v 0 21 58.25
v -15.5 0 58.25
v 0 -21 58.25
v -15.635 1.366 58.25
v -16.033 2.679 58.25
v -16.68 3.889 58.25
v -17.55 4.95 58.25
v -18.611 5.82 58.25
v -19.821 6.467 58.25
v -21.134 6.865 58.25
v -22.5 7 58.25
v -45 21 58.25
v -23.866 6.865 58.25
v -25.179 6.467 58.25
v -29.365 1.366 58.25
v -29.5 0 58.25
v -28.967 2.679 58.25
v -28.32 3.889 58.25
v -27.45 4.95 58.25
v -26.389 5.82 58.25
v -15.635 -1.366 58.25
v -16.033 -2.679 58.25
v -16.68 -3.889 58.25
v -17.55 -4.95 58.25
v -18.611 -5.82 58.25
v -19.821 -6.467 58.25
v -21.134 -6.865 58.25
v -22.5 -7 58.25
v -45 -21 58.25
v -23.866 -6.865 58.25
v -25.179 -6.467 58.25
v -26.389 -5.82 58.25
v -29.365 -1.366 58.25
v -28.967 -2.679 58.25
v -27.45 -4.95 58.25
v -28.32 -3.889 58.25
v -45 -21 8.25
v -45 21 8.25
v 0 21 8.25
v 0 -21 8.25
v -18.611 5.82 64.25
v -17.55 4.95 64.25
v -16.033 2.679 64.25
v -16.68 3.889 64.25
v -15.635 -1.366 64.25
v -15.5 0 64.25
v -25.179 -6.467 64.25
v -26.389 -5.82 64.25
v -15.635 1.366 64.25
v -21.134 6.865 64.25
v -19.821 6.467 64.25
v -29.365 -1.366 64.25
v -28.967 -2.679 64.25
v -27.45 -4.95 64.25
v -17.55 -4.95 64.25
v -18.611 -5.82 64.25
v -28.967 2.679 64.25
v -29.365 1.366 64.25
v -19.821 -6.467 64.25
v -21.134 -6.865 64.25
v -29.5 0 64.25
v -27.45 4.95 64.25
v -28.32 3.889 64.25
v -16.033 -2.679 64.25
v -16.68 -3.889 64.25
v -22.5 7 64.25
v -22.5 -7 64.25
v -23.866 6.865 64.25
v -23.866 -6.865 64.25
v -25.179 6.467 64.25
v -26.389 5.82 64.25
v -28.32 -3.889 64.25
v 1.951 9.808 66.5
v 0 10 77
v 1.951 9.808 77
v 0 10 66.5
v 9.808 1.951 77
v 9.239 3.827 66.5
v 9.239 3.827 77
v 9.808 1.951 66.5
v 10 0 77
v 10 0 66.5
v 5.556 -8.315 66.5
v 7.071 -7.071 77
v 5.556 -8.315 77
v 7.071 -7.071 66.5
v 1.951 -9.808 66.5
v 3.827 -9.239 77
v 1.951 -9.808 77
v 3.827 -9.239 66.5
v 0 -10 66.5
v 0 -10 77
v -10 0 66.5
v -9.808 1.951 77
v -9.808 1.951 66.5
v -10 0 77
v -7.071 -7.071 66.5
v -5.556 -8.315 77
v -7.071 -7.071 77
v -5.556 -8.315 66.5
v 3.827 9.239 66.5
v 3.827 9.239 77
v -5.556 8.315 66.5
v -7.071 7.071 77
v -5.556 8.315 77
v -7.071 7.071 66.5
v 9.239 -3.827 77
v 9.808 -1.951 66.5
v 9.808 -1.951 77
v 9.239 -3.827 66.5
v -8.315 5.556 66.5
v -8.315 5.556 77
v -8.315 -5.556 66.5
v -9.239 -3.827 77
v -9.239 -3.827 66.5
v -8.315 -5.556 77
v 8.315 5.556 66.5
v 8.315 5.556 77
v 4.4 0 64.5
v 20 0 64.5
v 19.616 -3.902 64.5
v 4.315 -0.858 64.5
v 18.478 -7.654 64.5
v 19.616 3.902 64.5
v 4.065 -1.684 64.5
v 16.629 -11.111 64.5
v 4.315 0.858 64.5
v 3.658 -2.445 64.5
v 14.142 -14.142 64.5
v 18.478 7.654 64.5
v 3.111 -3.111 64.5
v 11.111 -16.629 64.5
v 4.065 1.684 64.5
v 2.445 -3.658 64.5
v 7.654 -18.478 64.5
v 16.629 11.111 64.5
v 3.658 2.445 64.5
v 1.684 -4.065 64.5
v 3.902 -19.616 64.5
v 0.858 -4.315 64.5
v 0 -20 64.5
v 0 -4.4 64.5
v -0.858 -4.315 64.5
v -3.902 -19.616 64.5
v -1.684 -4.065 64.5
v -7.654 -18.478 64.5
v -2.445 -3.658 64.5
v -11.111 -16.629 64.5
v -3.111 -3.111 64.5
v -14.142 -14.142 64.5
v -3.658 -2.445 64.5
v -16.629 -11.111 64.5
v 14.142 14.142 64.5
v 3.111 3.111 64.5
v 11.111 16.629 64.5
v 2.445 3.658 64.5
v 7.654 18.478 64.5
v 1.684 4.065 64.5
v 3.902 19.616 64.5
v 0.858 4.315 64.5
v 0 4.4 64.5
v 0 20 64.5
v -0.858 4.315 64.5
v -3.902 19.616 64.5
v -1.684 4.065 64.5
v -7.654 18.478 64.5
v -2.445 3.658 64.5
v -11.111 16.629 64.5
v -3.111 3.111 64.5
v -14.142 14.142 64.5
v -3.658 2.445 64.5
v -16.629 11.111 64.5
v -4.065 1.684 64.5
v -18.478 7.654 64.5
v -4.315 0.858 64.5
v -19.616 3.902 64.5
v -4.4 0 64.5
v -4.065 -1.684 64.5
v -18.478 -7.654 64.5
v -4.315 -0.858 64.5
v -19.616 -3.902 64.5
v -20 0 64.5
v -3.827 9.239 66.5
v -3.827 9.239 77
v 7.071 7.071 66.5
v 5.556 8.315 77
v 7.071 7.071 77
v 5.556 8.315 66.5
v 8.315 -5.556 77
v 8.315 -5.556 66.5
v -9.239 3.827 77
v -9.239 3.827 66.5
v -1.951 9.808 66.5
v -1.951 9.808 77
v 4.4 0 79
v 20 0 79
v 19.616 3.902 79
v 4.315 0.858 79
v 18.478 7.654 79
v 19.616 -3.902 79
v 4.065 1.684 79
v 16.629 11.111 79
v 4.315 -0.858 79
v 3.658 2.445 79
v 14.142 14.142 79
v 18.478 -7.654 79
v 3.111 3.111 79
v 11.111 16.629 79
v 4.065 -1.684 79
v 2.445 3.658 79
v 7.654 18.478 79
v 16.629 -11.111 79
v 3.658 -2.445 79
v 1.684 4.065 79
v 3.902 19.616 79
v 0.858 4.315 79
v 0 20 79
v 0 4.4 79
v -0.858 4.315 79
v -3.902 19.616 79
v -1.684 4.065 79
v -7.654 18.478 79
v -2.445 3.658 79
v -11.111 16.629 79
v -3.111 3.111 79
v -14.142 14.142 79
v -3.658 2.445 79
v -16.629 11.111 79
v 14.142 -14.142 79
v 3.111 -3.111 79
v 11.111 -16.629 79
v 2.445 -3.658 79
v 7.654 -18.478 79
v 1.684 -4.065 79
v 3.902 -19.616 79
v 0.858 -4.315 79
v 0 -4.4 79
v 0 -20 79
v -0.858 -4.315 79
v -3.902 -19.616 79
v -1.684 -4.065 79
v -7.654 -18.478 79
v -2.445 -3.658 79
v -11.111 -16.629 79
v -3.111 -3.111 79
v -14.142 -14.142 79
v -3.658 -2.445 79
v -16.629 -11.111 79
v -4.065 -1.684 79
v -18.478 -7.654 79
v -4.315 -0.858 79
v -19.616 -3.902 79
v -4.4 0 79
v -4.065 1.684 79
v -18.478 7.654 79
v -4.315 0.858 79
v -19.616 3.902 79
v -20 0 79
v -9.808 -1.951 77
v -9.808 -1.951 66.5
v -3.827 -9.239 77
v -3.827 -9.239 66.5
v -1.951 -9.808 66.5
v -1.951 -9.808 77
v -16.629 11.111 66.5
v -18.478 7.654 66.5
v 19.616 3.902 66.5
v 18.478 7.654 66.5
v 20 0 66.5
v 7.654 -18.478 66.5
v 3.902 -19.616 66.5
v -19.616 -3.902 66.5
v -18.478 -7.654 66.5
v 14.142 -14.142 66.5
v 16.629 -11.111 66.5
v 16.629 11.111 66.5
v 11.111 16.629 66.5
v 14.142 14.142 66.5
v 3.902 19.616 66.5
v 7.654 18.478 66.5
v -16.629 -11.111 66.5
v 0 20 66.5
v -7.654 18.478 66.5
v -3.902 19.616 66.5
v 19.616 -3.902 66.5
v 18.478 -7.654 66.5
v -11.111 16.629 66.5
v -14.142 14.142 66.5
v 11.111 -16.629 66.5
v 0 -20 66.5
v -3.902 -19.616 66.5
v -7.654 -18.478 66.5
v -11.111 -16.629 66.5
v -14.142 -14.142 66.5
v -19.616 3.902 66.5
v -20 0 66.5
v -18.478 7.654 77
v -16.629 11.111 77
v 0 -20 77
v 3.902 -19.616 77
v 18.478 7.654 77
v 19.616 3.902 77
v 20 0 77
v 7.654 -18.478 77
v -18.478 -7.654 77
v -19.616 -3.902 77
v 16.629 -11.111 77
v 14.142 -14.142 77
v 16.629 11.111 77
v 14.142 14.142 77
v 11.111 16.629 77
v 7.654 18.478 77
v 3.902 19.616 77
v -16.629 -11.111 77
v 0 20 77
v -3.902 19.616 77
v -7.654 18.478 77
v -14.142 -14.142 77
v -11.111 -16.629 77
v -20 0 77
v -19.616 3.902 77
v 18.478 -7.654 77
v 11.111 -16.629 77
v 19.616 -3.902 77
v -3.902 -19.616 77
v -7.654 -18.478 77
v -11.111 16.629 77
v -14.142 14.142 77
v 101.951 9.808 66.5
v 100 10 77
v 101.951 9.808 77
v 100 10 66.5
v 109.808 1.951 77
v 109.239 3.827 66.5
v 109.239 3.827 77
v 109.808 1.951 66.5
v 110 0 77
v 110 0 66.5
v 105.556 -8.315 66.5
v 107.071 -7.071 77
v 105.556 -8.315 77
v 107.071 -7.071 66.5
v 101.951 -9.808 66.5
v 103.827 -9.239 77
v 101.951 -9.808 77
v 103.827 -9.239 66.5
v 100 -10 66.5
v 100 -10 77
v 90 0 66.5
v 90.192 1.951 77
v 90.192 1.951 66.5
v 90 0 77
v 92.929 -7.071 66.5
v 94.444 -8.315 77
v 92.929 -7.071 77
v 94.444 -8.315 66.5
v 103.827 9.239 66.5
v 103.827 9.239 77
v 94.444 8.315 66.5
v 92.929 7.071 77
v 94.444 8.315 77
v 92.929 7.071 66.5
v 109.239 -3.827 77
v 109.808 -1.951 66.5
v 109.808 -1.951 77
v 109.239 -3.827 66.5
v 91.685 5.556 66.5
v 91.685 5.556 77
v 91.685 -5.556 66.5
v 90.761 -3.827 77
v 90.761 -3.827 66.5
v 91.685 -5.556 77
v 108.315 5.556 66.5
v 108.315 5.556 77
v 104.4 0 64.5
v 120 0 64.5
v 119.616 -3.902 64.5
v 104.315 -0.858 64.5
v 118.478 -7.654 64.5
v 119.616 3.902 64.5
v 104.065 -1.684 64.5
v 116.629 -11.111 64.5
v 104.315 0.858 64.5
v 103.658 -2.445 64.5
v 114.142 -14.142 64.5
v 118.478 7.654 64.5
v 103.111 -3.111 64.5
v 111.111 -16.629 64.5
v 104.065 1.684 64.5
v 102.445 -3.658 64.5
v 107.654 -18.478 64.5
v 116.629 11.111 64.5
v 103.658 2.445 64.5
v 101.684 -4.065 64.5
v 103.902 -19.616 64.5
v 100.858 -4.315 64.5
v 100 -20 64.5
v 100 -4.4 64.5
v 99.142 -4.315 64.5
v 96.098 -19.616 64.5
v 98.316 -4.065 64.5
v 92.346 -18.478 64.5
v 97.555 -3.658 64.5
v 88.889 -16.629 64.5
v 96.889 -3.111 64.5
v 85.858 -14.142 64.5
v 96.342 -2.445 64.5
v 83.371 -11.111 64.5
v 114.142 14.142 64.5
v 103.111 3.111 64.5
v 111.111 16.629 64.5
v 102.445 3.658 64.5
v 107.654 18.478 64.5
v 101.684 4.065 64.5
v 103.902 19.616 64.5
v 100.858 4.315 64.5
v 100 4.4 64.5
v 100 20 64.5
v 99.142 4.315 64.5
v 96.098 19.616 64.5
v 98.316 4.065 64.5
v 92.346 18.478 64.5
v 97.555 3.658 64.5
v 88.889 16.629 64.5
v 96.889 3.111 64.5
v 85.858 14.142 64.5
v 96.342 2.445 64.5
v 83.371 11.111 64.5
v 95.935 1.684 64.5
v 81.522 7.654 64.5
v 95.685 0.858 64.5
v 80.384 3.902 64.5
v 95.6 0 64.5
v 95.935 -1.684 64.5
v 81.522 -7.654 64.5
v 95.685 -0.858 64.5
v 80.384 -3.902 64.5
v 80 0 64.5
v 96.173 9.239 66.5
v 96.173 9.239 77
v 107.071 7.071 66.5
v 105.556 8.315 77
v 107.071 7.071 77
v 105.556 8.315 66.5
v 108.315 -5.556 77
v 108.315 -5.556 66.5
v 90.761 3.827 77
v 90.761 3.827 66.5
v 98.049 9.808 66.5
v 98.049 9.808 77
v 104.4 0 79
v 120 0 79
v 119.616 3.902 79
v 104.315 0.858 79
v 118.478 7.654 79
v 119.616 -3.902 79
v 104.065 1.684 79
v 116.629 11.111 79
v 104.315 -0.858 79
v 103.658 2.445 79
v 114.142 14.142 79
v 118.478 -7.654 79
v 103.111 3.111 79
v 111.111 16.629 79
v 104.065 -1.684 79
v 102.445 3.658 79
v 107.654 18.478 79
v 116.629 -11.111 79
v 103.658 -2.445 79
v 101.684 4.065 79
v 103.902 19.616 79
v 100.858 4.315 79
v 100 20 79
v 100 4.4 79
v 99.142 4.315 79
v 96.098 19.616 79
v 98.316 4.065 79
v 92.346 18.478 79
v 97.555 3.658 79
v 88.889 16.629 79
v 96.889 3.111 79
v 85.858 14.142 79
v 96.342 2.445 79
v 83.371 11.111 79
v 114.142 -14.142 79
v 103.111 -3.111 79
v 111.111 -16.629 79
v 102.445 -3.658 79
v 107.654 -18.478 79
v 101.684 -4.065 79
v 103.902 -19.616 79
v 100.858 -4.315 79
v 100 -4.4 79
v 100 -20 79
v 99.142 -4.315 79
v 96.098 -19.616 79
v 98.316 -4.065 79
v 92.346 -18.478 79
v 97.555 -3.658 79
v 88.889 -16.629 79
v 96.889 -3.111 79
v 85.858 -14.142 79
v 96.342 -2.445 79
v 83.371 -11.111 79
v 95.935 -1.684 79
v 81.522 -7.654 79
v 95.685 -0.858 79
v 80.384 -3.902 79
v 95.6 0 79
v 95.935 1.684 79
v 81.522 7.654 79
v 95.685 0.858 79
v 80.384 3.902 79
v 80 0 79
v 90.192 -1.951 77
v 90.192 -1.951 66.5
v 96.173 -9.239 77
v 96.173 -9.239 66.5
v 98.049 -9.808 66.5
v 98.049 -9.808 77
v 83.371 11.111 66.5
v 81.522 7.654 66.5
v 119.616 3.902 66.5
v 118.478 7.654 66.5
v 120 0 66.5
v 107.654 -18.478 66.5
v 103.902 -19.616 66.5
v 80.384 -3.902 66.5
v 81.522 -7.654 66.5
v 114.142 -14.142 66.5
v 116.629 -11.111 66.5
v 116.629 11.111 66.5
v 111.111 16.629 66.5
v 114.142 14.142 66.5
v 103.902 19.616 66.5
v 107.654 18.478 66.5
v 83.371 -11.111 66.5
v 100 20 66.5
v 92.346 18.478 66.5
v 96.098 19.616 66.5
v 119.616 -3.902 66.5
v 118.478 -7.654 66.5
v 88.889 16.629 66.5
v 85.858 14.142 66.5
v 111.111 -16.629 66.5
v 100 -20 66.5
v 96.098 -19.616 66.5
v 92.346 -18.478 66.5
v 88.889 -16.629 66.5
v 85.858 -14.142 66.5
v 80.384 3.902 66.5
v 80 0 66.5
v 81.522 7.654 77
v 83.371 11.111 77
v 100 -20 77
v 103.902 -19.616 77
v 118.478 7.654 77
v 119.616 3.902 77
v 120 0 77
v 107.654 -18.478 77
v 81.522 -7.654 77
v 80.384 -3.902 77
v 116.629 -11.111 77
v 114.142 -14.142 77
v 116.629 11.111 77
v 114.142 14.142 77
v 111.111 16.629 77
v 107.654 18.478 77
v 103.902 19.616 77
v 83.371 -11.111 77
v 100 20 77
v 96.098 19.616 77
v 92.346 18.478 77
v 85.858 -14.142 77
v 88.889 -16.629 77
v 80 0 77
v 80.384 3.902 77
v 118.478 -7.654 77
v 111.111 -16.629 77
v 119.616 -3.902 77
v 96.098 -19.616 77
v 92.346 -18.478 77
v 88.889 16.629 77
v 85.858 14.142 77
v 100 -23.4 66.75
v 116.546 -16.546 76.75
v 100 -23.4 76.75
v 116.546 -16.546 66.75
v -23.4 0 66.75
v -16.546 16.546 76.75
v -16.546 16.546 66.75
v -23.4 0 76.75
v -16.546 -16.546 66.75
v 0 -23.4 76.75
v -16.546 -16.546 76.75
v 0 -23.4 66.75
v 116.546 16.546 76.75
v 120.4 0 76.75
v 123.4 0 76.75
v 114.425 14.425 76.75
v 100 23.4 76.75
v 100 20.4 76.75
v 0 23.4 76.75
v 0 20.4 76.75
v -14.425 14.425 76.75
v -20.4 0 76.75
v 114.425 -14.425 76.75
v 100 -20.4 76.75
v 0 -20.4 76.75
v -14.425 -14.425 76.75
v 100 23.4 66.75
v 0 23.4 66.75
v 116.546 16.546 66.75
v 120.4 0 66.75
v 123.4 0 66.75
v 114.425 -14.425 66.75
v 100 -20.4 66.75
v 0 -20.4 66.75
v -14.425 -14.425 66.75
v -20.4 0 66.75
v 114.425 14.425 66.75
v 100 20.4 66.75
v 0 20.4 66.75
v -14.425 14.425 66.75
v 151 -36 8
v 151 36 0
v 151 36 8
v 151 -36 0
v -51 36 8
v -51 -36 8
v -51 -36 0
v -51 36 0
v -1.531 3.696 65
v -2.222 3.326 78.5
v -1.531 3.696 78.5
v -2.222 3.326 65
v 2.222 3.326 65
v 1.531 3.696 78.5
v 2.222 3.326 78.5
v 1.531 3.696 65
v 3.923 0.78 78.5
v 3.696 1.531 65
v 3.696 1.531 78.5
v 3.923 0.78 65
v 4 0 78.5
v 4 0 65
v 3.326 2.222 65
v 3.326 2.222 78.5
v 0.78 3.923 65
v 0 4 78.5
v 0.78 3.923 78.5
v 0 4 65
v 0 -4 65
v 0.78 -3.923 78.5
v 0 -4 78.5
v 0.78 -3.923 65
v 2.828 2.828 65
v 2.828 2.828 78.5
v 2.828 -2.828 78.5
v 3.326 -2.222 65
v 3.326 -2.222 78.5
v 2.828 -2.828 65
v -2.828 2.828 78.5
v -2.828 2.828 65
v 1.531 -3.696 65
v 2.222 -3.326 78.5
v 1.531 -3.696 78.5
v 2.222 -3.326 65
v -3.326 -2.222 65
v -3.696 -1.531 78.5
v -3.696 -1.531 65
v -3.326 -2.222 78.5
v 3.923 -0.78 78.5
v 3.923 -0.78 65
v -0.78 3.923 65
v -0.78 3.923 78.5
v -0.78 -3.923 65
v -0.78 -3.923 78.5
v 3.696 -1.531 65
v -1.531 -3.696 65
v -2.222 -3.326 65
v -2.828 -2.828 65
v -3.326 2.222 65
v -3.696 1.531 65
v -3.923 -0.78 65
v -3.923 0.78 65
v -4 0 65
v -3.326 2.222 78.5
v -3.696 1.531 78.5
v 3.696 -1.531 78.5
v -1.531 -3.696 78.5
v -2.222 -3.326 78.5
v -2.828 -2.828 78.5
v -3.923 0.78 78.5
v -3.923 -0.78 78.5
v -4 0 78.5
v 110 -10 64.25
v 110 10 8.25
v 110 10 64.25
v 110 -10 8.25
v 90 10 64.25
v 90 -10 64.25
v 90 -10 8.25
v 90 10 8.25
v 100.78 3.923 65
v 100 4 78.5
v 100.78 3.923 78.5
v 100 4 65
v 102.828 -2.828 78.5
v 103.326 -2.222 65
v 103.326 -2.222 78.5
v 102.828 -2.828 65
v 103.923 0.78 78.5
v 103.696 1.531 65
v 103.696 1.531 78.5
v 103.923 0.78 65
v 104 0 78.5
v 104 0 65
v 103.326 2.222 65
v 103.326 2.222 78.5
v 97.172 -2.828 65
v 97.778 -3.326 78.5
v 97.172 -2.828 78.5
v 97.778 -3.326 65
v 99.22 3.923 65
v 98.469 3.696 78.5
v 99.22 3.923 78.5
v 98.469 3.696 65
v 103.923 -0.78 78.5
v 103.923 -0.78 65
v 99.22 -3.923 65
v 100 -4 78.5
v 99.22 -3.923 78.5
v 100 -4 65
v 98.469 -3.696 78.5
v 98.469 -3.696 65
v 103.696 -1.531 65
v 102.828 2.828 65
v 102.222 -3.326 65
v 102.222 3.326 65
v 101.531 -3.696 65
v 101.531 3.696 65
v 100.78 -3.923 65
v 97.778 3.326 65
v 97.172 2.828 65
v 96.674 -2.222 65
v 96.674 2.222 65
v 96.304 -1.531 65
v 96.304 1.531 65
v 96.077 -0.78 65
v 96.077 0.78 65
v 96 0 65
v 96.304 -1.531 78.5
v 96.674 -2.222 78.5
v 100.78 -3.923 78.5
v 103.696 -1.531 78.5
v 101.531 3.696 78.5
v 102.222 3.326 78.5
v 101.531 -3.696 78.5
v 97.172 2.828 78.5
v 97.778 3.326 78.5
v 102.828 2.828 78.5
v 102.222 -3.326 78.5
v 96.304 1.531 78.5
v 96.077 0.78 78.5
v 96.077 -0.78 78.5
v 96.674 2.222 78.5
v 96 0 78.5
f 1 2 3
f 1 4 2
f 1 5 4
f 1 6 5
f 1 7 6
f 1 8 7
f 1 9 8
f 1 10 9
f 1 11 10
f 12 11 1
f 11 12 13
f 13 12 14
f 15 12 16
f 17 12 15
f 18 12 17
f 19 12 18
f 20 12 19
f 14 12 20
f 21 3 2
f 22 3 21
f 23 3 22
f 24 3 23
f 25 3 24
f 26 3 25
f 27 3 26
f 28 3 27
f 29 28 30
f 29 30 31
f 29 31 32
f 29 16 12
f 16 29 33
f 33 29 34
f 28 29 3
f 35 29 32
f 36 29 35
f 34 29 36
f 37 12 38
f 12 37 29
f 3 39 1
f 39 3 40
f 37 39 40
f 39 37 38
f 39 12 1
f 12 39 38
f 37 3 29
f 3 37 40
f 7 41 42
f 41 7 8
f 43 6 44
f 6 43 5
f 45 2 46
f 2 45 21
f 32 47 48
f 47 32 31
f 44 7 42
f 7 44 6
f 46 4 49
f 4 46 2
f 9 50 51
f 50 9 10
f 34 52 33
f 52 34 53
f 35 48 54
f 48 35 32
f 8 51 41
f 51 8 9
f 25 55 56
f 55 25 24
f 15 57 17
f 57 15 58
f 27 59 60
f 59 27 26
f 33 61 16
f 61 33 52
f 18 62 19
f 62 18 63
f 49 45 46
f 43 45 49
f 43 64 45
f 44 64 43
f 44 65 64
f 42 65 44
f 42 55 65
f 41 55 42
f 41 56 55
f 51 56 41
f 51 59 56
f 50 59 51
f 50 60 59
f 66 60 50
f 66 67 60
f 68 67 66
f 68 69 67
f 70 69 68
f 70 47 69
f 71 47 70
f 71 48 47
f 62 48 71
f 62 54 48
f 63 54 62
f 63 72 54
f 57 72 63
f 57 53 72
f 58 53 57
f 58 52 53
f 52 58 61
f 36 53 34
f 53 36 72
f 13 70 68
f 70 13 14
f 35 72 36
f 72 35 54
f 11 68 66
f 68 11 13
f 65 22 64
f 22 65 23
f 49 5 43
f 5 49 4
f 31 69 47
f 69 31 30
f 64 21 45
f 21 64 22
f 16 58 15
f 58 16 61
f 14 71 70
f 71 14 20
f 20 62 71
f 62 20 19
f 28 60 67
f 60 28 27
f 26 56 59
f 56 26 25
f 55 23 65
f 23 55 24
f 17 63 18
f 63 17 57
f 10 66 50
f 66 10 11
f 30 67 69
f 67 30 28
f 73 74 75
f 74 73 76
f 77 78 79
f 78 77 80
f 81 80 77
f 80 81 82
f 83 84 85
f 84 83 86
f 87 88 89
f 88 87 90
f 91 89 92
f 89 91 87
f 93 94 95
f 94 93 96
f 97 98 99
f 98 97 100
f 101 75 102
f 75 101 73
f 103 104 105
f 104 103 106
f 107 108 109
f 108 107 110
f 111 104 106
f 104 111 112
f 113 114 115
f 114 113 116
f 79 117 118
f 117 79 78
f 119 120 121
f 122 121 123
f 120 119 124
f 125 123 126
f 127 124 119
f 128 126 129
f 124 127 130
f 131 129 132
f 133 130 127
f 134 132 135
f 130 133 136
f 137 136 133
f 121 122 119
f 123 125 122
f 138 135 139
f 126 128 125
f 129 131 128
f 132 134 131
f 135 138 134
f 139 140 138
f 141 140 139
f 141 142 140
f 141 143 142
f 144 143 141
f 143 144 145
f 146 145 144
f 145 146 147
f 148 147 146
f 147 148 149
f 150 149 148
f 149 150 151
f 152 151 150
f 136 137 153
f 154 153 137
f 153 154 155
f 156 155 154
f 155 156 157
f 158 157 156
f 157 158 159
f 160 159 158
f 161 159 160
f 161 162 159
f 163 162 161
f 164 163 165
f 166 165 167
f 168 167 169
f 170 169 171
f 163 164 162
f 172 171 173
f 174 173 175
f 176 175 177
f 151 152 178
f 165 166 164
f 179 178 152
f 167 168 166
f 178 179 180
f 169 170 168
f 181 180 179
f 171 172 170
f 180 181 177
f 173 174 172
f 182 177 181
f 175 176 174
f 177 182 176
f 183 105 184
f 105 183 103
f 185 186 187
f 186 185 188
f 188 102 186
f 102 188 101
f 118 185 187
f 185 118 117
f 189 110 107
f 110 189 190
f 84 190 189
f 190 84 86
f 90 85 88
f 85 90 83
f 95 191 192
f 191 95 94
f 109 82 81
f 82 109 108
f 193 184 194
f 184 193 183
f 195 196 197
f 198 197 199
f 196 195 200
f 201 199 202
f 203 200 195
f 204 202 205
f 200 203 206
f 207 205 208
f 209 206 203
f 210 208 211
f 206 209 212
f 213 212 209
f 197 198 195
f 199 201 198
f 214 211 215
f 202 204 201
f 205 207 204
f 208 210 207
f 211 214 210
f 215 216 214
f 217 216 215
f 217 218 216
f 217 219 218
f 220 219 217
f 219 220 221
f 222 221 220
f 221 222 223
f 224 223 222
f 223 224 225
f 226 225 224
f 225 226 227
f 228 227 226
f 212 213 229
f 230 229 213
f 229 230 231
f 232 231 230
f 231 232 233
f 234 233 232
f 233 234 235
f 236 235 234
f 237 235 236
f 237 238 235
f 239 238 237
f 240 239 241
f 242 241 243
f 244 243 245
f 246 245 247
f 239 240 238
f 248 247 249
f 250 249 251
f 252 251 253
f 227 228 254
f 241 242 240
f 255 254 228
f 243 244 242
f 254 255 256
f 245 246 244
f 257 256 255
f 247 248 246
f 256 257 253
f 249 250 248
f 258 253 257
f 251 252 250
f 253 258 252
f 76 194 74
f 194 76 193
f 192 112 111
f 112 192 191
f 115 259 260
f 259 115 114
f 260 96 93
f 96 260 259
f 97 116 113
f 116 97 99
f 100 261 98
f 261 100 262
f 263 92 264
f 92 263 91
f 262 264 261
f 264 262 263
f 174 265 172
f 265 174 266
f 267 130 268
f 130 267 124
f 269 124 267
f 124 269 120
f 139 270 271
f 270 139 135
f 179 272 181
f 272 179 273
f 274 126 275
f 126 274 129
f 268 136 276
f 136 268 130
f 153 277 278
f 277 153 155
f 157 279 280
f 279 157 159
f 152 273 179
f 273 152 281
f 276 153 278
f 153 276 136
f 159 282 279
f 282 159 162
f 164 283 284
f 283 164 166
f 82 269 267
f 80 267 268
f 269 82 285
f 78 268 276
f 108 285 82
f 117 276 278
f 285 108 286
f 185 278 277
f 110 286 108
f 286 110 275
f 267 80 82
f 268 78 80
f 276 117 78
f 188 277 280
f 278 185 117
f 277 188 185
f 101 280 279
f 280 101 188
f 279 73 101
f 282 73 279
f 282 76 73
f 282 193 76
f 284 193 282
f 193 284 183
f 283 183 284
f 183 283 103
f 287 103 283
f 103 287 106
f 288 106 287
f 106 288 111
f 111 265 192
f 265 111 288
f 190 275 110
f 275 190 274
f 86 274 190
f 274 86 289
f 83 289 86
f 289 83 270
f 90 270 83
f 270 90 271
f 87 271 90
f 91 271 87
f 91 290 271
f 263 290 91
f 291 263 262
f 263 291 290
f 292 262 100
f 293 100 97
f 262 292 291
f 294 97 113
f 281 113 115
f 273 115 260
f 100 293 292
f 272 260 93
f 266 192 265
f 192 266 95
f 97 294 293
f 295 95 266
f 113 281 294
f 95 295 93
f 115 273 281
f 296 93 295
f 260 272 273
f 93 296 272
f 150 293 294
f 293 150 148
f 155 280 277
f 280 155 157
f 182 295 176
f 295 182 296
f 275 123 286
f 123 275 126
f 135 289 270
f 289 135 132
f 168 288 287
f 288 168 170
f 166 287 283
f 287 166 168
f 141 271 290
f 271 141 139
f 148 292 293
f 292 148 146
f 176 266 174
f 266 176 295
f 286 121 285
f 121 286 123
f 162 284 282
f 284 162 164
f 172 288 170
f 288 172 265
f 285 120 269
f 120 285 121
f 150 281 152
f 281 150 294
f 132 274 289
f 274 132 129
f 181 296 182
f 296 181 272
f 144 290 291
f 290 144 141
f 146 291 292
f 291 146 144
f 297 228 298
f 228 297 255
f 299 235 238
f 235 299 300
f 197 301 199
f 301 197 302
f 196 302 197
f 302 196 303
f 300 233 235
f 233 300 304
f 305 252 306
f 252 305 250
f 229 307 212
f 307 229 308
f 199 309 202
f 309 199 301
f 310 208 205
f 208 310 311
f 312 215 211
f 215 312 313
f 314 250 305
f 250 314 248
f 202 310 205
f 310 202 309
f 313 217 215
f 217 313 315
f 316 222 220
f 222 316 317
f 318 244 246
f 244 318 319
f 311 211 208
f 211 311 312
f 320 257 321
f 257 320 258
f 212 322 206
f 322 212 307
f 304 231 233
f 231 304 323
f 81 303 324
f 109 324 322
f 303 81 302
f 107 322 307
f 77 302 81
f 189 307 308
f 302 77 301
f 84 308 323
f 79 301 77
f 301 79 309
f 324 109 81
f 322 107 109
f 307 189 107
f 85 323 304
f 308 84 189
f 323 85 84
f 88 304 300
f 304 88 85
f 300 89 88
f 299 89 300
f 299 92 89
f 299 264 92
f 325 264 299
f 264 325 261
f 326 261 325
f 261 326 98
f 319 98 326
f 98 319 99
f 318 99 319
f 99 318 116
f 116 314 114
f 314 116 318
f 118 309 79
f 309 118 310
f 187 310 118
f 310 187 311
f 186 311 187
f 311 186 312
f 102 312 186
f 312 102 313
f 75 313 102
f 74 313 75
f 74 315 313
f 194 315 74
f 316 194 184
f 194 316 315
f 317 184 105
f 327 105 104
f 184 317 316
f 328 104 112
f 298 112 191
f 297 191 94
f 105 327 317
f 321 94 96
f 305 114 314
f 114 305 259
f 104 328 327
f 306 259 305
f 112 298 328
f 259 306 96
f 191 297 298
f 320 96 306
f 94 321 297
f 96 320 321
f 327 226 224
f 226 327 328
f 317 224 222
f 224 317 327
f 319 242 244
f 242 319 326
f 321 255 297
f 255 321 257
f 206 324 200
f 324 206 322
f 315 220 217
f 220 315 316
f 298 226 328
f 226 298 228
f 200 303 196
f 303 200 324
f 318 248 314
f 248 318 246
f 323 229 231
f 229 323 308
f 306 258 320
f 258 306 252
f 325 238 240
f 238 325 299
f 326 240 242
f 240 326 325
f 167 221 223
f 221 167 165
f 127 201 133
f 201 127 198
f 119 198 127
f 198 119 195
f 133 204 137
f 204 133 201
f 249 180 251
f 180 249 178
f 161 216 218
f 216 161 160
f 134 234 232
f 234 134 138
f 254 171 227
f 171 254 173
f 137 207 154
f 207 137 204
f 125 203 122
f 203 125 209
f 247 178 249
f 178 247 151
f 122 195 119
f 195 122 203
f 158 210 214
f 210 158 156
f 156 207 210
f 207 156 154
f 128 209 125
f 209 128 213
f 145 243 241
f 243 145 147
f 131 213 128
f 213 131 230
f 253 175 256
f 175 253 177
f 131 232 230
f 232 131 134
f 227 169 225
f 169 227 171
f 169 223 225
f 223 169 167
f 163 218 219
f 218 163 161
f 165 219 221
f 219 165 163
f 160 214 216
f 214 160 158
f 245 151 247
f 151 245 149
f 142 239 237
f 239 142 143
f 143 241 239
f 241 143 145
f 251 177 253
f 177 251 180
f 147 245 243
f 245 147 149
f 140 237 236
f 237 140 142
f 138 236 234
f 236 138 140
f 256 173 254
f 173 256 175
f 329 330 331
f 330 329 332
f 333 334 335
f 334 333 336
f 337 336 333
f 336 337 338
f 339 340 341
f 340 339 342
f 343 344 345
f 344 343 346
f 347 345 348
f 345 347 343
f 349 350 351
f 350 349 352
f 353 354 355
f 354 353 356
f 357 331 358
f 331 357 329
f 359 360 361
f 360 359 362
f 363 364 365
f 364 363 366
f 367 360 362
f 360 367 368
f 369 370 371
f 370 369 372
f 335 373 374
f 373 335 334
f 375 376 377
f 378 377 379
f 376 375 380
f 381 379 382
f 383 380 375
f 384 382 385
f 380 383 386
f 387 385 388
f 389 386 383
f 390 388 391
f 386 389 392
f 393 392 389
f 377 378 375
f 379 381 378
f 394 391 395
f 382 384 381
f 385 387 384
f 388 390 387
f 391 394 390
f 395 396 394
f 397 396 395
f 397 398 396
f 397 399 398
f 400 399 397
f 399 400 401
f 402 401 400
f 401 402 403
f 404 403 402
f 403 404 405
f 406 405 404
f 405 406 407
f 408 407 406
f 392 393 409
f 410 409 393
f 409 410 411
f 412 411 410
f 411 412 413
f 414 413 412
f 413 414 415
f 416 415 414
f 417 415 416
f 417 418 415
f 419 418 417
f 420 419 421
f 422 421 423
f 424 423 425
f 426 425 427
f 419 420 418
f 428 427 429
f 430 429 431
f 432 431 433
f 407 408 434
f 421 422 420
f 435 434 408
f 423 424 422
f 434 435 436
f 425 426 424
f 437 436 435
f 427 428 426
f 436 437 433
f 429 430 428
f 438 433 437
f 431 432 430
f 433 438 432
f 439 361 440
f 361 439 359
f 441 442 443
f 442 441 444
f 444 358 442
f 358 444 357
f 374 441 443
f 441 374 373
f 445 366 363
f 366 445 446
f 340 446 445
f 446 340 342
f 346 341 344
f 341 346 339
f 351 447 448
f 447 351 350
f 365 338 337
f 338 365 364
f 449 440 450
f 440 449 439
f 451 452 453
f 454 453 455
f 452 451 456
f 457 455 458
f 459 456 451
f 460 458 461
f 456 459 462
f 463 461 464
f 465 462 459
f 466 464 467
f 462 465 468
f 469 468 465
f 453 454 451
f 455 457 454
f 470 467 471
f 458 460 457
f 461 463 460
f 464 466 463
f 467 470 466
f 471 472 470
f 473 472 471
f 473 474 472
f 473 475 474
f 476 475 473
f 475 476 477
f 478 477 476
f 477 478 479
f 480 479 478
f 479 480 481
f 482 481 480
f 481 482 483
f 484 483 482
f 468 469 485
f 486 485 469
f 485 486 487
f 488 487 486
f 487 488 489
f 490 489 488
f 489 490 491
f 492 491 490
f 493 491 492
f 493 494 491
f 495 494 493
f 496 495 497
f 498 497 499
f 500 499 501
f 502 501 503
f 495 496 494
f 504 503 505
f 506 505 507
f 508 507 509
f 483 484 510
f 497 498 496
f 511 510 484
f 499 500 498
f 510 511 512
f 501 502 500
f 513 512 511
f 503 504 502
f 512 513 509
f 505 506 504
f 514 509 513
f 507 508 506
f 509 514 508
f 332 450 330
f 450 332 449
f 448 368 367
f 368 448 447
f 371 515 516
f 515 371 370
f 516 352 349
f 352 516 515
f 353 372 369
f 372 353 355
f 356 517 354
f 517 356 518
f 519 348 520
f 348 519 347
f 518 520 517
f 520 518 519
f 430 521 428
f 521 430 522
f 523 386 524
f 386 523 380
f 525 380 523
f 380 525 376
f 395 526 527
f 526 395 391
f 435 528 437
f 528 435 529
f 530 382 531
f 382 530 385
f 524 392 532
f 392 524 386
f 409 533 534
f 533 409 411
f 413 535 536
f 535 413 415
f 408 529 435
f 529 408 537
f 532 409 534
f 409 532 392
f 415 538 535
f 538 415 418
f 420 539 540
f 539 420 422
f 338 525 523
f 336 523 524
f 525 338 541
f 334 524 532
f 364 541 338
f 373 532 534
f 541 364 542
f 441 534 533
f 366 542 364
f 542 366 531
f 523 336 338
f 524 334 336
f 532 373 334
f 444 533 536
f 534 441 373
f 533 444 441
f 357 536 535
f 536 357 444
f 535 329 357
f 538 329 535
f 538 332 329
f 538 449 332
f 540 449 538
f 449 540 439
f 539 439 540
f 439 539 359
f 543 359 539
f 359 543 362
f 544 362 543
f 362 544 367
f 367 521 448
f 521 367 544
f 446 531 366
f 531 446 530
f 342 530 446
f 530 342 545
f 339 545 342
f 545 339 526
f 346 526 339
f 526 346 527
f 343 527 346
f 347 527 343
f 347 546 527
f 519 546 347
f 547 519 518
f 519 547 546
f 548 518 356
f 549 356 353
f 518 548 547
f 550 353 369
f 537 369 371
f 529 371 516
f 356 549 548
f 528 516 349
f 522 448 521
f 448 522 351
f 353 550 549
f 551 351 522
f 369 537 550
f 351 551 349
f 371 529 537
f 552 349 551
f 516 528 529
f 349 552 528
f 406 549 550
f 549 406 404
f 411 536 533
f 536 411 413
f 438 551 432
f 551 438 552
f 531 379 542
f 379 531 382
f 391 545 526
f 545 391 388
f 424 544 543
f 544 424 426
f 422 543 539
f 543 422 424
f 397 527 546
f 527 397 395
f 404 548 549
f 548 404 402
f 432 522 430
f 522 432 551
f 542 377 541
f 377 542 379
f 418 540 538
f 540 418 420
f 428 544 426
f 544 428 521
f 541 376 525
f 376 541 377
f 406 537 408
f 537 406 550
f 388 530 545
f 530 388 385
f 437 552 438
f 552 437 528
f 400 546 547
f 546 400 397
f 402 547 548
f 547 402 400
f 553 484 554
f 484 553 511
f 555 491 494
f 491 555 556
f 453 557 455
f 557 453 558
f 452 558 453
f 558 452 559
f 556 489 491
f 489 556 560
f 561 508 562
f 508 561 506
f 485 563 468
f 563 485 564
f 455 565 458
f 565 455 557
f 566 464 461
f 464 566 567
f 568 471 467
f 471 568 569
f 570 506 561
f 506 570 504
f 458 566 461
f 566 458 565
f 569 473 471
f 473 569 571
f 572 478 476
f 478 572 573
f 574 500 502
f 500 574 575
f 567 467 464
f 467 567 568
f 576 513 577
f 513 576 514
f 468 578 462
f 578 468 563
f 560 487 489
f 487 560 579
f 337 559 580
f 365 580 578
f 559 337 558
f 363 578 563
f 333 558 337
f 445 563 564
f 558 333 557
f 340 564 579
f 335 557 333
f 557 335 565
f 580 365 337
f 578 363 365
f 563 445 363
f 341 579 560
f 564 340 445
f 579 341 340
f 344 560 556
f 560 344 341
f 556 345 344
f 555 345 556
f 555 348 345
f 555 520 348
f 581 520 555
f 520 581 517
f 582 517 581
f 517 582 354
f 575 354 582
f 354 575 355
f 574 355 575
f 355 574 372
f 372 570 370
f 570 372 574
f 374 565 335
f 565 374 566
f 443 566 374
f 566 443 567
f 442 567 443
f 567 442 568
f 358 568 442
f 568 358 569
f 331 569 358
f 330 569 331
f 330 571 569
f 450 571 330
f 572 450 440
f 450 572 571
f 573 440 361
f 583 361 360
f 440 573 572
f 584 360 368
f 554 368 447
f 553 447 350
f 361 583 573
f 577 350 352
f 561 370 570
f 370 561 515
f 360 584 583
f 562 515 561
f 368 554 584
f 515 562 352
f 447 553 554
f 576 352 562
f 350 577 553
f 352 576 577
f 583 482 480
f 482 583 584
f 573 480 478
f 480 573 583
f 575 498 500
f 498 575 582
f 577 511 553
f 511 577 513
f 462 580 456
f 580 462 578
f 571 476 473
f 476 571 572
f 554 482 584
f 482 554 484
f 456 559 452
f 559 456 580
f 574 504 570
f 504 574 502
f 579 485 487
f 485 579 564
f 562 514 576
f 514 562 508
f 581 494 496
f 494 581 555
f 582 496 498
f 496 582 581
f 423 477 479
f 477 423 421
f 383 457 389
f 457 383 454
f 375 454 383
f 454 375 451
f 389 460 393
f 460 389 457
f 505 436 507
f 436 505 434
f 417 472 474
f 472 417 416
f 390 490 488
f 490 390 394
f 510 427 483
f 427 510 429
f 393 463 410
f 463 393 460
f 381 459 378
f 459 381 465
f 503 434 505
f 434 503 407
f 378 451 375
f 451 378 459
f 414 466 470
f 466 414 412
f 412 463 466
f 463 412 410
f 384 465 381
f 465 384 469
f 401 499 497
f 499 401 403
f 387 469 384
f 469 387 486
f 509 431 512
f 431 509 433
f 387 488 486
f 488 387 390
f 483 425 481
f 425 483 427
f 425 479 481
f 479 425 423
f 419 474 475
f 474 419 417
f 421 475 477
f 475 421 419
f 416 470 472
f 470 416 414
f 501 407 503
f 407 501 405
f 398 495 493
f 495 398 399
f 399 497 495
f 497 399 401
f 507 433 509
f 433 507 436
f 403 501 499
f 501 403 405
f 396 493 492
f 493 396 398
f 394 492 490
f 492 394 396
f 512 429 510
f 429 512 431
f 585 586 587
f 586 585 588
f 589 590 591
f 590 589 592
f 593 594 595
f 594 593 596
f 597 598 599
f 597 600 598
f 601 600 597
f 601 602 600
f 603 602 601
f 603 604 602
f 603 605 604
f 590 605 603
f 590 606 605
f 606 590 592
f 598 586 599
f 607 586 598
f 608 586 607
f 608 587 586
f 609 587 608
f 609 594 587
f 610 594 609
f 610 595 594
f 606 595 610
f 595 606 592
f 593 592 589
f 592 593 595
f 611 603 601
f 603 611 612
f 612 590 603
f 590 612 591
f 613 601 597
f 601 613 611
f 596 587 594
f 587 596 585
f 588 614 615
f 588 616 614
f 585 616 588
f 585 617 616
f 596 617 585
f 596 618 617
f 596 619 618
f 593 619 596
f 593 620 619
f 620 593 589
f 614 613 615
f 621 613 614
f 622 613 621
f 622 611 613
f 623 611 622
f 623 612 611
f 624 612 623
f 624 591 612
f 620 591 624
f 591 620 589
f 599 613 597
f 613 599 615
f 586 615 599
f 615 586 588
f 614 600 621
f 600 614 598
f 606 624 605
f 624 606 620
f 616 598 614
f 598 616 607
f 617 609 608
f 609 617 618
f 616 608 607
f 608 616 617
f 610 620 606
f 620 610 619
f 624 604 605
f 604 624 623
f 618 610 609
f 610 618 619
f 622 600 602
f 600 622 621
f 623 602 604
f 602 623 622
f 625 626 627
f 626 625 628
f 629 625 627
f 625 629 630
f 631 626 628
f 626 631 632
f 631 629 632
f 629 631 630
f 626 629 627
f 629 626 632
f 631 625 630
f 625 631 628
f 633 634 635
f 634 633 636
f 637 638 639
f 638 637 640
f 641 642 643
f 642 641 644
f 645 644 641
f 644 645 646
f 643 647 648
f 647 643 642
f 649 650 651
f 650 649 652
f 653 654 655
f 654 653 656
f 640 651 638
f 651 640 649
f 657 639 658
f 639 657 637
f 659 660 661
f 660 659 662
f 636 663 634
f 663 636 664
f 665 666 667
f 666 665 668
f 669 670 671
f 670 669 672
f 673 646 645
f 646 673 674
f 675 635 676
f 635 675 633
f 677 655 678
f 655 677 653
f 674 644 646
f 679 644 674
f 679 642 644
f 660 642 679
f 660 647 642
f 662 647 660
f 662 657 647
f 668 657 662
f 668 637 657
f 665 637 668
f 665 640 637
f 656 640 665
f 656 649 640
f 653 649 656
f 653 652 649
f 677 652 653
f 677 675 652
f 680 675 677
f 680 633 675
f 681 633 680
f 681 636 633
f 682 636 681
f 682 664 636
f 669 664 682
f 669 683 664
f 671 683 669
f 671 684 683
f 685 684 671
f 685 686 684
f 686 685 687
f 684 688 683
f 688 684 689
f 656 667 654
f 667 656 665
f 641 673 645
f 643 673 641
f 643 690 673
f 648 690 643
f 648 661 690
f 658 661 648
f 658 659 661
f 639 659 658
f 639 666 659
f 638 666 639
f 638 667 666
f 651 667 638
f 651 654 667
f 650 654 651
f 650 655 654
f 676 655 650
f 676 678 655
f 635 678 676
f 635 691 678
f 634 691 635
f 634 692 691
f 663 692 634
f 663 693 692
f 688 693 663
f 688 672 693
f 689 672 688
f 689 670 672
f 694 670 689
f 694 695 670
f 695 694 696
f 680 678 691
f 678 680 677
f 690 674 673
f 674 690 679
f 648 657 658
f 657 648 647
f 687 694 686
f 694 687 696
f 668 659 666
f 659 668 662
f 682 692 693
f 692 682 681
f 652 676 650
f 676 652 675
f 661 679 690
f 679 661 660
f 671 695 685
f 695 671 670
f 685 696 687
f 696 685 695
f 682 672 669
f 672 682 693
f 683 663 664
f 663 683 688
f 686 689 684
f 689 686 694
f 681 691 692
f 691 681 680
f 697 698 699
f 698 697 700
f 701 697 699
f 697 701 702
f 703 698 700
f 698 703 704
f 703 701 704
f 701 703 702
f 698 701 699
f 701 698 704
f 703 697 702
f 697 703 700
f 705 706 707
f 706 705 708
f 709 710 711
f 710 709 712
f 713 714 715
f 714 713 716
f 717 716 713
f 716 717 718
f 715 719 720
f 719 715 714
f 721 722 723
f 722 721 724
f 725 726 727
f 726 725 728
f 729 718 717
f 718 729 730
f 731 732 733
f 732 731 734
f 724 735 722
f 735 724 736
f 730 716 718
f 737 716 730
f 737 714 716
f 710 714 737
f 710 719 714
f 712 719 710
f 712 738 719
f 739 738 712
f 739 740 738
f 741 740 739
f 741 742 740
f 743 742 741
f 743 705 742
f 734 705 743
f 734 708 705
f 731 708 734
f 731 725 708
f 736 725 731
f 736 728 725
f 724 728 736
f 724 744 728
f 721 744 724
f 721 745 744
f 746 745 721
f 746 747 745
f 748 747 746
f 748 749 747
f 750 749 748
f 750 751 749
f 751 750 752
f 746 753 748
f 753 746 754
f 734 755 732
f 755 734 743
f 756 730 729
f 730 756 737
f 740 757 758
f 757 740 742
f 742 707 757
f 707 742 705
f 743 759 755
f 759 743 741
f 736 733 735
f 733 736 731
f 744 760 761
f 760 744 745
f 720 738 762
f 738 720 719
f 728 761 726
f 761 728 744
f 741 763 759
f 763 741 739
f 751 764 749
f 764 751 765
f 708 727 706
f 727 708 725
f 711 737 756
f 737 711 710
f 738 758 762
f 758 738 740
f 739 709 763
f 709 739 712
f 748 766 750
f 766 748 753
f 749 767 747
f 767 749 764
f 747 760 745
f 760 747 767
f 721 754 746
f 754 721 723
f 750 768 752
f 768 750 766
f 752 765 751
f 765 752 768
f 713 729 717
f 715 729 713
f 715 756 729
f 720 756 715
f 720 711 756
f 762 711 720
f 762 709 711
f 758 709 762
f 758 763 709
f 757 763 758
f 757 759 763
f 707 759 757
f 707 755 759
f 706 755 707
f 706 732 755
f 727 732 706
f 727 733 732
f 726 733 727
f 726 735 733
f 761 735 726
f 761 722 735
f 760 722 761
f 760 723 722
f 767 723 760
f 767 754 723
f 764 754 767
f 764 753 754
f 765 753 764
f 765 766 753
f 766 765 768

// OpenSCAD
$fn = 32;

// ------------------------------------------------------------------------
// Motor belt drive: span 100 mm, pulleys d40, belt 10 mm wide
// Every part is its own module, assembly() places every instance.
// ------------------------------------------------------------------------

// --- part 1 ---
module base_plate() {
  difference() {
    translate([-101, -36, 0]) cube([202, 72, 8]);
  }
}

// --- part 2 ---
module motor() {
  union() {
    translate([-25, -21, 0]) cube([50, 42, 45]);
    translate([28, 0, 22.5]) rotate([0, 90, 0]) cylinder(h = 6, d = 14, center = true);
  }
}

// --- part 3 ---
module drive_shaft() {
  translate([0, 0, -6.75]) cylinder(h = 13.5, d = 8);
}

// --- part 4 ---
module pulley_drive() {
  difference() {
    union() {
      cylinder(h = 14.5, d = 20);
      cylinder(h = 2, d = 40);
      translate([0, 0, 12.5]) cylinder(h = 2, d = 40);
    }
    translate([0, 0, -1]) cylinder(h = 16.5, d = 8.8);
  }
}

// --- part 5 ---
module idler_post() {
  translate([-10, -10, 0]) cube([20, 20, 56]);
}

// --- part 6 ---
module driven_shaft() {
  translate([0, 0, -6.75]) cylinder(h = 13.5, d = 8);
}

// --- part 7 ---
module pulley_driven() {
  difference() {
    union() {
      cylinder(h = 14.5, d = 20);
      cylinder(h = 2, d = 40);
      translate([0, 0, 12.5]) cylinder(h = 2, d = 40);
    }
    translate([0, 0, -1]) cylinder(h = 16.5, d = 8.8);
  }
}

// --- part 8 ---
module drive_belt() {
  difference() {
    linear_extrude(height = 10) polygon(points = concat([for (a = [90 : 45 : 270]) [23.4 * cos(a), 23.4 * sin(a)]], [for (a = [270 : 45 : 450]) [100 + 23.4 * cos(a), 23.4 * sin(a)]]));
    translate([0, 0, -1]) linear_extrude(height = 12) polygon(points = concat([for (a = [90 : 45 : 270]) [20.4 * cos(a), 20.4 * sin(a)]], [for (a = [270 : 45 : 450]) [100 + 20.4 * cos(a), 20.4 * sin(a)]]));
  }
}

// --- assembly ---
module assembly() {
  color([0.80, 0.24, 0.20]) translate([50, 0, 0]) rotate([0, 0, 0]) base_plate();
  color([0.20, 0.45, 0.75]) translate([0, 0, 33.25]) rotate([0, 270, 0]) motor();
  color([0.25, 0.62, 0.32]) translate([0, 0, 71.75]) rotate([0, 0, 0]) drive_shaft();
  color([0.92, 0.70, 0.18]) translate([0, 0, 64.5]) rotate([0, 0, 0]) pulley_drive();
  color([0.58, 0.35, 0.70]) translate([100, 0, 8.25]) rotate([0, 0, 0]) idler_post();
  color([0.16, 0.66, 0.66]) translate([100, 0, 71.75]) rotate([0, 0, 0]) driven_shaft();
  color([0.85, 0.48, 0.18]) translate([100, 0, 64.5]) rotate([0, 0, 0]) pulley_driven();
  color([0.55, 0.60, 0.65]) translate([0, 0, 66.75]) rotate([0, 0, 0]) drive_belt();
}

assembly();
